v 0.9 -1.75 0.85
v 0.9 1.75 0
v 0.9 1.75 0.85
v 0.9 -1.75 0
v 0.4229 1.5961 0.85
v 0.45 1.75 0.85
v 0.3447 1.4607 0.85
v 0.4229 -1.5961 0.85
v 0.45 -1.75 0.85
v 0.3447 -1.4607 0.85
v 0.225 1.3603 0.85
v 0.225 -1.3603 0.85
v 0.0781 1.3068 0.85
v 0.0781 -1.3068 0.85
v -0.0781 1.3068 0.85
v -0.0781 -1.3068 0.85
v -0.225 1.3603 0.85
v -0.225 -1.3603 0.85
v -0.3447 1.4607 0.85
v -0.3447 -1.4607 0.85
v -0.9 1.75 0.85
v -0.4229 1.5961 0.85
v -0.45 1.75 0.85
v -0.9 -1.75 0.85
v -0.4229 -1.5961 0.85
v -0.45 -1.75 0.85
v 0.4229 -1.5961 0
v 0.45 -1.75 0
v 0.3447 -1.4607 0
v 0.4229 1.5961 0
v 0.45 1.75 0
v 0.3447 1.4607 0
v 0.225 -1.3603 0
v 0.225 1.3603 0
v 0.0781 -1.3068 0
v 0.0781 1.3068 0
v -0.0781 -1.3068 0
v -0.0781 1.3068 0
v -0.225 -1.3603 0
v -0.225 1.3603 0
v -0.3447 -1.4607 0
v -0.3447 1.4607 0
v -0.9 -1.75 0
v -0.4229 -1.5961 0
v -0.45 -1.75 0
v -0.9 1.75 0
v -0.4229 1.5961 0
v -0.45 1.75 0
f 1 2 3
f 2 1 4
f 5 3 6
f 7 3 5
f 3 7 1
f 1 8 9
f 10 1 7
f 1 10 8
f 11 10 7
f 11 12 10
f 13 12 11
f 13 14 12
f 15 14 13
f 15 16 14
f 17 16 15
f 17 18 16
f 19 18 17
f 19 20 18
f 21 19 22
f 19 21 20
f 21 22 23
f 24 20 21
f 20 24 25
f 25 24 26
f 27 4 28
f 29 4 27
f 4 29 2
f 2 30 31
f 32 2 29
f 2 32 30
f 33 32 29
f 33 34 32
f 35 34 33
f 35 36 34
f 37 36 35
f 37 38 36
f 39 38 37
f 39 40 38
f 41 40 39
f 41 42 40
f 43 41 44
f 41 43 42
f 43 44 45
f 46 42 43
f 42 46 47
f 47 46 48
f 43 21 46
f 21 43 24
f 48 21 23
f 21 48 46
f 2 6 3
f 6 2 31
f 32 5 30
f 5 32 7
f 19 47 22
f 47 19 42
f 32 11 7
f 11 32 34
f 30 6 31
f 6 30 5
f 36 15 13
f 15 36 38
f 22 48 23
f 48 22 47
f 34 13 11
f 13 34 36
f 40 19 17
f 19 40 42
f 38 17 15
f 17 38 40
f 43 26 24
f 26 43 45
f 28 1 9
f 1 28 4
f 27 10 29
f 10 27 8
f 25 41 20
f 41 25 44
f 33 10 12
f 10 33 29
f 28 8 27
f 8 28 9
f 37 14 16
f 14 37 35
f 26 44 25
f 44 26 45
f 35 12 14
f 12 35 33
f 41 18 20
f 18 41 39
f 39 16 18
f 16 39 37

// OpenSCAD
module pad(width, height, length, hole_radius)
{
    difference()
    {
        translate([0, length/2, height/2]) cube([width, length, height], center=true);
        translate([0, length, 0]) cylinder(h=height, r=hole_radius, $fn=18);
    }
}

module body(width, height, length)
{
      translate([0, 0, height/2])cube([width, length, height], center=true);  
}

module fuse_1206()
{
    A=3.5;
    B=1.8;
    C=0.85;
    D=0.75;
    E=0.45;
    body_length = A-2*D;
    union()
    {
        translate([0, body_length/2, 0]) color("gray") pad(B, C, D, E);
        translate([0, -body_length/2, 0]) mirror([0, 1 , 0]) color("gray") pad(B, C, D, E);
        color("green") body(B, C, body_length);
    }
}

fuse_1206();
